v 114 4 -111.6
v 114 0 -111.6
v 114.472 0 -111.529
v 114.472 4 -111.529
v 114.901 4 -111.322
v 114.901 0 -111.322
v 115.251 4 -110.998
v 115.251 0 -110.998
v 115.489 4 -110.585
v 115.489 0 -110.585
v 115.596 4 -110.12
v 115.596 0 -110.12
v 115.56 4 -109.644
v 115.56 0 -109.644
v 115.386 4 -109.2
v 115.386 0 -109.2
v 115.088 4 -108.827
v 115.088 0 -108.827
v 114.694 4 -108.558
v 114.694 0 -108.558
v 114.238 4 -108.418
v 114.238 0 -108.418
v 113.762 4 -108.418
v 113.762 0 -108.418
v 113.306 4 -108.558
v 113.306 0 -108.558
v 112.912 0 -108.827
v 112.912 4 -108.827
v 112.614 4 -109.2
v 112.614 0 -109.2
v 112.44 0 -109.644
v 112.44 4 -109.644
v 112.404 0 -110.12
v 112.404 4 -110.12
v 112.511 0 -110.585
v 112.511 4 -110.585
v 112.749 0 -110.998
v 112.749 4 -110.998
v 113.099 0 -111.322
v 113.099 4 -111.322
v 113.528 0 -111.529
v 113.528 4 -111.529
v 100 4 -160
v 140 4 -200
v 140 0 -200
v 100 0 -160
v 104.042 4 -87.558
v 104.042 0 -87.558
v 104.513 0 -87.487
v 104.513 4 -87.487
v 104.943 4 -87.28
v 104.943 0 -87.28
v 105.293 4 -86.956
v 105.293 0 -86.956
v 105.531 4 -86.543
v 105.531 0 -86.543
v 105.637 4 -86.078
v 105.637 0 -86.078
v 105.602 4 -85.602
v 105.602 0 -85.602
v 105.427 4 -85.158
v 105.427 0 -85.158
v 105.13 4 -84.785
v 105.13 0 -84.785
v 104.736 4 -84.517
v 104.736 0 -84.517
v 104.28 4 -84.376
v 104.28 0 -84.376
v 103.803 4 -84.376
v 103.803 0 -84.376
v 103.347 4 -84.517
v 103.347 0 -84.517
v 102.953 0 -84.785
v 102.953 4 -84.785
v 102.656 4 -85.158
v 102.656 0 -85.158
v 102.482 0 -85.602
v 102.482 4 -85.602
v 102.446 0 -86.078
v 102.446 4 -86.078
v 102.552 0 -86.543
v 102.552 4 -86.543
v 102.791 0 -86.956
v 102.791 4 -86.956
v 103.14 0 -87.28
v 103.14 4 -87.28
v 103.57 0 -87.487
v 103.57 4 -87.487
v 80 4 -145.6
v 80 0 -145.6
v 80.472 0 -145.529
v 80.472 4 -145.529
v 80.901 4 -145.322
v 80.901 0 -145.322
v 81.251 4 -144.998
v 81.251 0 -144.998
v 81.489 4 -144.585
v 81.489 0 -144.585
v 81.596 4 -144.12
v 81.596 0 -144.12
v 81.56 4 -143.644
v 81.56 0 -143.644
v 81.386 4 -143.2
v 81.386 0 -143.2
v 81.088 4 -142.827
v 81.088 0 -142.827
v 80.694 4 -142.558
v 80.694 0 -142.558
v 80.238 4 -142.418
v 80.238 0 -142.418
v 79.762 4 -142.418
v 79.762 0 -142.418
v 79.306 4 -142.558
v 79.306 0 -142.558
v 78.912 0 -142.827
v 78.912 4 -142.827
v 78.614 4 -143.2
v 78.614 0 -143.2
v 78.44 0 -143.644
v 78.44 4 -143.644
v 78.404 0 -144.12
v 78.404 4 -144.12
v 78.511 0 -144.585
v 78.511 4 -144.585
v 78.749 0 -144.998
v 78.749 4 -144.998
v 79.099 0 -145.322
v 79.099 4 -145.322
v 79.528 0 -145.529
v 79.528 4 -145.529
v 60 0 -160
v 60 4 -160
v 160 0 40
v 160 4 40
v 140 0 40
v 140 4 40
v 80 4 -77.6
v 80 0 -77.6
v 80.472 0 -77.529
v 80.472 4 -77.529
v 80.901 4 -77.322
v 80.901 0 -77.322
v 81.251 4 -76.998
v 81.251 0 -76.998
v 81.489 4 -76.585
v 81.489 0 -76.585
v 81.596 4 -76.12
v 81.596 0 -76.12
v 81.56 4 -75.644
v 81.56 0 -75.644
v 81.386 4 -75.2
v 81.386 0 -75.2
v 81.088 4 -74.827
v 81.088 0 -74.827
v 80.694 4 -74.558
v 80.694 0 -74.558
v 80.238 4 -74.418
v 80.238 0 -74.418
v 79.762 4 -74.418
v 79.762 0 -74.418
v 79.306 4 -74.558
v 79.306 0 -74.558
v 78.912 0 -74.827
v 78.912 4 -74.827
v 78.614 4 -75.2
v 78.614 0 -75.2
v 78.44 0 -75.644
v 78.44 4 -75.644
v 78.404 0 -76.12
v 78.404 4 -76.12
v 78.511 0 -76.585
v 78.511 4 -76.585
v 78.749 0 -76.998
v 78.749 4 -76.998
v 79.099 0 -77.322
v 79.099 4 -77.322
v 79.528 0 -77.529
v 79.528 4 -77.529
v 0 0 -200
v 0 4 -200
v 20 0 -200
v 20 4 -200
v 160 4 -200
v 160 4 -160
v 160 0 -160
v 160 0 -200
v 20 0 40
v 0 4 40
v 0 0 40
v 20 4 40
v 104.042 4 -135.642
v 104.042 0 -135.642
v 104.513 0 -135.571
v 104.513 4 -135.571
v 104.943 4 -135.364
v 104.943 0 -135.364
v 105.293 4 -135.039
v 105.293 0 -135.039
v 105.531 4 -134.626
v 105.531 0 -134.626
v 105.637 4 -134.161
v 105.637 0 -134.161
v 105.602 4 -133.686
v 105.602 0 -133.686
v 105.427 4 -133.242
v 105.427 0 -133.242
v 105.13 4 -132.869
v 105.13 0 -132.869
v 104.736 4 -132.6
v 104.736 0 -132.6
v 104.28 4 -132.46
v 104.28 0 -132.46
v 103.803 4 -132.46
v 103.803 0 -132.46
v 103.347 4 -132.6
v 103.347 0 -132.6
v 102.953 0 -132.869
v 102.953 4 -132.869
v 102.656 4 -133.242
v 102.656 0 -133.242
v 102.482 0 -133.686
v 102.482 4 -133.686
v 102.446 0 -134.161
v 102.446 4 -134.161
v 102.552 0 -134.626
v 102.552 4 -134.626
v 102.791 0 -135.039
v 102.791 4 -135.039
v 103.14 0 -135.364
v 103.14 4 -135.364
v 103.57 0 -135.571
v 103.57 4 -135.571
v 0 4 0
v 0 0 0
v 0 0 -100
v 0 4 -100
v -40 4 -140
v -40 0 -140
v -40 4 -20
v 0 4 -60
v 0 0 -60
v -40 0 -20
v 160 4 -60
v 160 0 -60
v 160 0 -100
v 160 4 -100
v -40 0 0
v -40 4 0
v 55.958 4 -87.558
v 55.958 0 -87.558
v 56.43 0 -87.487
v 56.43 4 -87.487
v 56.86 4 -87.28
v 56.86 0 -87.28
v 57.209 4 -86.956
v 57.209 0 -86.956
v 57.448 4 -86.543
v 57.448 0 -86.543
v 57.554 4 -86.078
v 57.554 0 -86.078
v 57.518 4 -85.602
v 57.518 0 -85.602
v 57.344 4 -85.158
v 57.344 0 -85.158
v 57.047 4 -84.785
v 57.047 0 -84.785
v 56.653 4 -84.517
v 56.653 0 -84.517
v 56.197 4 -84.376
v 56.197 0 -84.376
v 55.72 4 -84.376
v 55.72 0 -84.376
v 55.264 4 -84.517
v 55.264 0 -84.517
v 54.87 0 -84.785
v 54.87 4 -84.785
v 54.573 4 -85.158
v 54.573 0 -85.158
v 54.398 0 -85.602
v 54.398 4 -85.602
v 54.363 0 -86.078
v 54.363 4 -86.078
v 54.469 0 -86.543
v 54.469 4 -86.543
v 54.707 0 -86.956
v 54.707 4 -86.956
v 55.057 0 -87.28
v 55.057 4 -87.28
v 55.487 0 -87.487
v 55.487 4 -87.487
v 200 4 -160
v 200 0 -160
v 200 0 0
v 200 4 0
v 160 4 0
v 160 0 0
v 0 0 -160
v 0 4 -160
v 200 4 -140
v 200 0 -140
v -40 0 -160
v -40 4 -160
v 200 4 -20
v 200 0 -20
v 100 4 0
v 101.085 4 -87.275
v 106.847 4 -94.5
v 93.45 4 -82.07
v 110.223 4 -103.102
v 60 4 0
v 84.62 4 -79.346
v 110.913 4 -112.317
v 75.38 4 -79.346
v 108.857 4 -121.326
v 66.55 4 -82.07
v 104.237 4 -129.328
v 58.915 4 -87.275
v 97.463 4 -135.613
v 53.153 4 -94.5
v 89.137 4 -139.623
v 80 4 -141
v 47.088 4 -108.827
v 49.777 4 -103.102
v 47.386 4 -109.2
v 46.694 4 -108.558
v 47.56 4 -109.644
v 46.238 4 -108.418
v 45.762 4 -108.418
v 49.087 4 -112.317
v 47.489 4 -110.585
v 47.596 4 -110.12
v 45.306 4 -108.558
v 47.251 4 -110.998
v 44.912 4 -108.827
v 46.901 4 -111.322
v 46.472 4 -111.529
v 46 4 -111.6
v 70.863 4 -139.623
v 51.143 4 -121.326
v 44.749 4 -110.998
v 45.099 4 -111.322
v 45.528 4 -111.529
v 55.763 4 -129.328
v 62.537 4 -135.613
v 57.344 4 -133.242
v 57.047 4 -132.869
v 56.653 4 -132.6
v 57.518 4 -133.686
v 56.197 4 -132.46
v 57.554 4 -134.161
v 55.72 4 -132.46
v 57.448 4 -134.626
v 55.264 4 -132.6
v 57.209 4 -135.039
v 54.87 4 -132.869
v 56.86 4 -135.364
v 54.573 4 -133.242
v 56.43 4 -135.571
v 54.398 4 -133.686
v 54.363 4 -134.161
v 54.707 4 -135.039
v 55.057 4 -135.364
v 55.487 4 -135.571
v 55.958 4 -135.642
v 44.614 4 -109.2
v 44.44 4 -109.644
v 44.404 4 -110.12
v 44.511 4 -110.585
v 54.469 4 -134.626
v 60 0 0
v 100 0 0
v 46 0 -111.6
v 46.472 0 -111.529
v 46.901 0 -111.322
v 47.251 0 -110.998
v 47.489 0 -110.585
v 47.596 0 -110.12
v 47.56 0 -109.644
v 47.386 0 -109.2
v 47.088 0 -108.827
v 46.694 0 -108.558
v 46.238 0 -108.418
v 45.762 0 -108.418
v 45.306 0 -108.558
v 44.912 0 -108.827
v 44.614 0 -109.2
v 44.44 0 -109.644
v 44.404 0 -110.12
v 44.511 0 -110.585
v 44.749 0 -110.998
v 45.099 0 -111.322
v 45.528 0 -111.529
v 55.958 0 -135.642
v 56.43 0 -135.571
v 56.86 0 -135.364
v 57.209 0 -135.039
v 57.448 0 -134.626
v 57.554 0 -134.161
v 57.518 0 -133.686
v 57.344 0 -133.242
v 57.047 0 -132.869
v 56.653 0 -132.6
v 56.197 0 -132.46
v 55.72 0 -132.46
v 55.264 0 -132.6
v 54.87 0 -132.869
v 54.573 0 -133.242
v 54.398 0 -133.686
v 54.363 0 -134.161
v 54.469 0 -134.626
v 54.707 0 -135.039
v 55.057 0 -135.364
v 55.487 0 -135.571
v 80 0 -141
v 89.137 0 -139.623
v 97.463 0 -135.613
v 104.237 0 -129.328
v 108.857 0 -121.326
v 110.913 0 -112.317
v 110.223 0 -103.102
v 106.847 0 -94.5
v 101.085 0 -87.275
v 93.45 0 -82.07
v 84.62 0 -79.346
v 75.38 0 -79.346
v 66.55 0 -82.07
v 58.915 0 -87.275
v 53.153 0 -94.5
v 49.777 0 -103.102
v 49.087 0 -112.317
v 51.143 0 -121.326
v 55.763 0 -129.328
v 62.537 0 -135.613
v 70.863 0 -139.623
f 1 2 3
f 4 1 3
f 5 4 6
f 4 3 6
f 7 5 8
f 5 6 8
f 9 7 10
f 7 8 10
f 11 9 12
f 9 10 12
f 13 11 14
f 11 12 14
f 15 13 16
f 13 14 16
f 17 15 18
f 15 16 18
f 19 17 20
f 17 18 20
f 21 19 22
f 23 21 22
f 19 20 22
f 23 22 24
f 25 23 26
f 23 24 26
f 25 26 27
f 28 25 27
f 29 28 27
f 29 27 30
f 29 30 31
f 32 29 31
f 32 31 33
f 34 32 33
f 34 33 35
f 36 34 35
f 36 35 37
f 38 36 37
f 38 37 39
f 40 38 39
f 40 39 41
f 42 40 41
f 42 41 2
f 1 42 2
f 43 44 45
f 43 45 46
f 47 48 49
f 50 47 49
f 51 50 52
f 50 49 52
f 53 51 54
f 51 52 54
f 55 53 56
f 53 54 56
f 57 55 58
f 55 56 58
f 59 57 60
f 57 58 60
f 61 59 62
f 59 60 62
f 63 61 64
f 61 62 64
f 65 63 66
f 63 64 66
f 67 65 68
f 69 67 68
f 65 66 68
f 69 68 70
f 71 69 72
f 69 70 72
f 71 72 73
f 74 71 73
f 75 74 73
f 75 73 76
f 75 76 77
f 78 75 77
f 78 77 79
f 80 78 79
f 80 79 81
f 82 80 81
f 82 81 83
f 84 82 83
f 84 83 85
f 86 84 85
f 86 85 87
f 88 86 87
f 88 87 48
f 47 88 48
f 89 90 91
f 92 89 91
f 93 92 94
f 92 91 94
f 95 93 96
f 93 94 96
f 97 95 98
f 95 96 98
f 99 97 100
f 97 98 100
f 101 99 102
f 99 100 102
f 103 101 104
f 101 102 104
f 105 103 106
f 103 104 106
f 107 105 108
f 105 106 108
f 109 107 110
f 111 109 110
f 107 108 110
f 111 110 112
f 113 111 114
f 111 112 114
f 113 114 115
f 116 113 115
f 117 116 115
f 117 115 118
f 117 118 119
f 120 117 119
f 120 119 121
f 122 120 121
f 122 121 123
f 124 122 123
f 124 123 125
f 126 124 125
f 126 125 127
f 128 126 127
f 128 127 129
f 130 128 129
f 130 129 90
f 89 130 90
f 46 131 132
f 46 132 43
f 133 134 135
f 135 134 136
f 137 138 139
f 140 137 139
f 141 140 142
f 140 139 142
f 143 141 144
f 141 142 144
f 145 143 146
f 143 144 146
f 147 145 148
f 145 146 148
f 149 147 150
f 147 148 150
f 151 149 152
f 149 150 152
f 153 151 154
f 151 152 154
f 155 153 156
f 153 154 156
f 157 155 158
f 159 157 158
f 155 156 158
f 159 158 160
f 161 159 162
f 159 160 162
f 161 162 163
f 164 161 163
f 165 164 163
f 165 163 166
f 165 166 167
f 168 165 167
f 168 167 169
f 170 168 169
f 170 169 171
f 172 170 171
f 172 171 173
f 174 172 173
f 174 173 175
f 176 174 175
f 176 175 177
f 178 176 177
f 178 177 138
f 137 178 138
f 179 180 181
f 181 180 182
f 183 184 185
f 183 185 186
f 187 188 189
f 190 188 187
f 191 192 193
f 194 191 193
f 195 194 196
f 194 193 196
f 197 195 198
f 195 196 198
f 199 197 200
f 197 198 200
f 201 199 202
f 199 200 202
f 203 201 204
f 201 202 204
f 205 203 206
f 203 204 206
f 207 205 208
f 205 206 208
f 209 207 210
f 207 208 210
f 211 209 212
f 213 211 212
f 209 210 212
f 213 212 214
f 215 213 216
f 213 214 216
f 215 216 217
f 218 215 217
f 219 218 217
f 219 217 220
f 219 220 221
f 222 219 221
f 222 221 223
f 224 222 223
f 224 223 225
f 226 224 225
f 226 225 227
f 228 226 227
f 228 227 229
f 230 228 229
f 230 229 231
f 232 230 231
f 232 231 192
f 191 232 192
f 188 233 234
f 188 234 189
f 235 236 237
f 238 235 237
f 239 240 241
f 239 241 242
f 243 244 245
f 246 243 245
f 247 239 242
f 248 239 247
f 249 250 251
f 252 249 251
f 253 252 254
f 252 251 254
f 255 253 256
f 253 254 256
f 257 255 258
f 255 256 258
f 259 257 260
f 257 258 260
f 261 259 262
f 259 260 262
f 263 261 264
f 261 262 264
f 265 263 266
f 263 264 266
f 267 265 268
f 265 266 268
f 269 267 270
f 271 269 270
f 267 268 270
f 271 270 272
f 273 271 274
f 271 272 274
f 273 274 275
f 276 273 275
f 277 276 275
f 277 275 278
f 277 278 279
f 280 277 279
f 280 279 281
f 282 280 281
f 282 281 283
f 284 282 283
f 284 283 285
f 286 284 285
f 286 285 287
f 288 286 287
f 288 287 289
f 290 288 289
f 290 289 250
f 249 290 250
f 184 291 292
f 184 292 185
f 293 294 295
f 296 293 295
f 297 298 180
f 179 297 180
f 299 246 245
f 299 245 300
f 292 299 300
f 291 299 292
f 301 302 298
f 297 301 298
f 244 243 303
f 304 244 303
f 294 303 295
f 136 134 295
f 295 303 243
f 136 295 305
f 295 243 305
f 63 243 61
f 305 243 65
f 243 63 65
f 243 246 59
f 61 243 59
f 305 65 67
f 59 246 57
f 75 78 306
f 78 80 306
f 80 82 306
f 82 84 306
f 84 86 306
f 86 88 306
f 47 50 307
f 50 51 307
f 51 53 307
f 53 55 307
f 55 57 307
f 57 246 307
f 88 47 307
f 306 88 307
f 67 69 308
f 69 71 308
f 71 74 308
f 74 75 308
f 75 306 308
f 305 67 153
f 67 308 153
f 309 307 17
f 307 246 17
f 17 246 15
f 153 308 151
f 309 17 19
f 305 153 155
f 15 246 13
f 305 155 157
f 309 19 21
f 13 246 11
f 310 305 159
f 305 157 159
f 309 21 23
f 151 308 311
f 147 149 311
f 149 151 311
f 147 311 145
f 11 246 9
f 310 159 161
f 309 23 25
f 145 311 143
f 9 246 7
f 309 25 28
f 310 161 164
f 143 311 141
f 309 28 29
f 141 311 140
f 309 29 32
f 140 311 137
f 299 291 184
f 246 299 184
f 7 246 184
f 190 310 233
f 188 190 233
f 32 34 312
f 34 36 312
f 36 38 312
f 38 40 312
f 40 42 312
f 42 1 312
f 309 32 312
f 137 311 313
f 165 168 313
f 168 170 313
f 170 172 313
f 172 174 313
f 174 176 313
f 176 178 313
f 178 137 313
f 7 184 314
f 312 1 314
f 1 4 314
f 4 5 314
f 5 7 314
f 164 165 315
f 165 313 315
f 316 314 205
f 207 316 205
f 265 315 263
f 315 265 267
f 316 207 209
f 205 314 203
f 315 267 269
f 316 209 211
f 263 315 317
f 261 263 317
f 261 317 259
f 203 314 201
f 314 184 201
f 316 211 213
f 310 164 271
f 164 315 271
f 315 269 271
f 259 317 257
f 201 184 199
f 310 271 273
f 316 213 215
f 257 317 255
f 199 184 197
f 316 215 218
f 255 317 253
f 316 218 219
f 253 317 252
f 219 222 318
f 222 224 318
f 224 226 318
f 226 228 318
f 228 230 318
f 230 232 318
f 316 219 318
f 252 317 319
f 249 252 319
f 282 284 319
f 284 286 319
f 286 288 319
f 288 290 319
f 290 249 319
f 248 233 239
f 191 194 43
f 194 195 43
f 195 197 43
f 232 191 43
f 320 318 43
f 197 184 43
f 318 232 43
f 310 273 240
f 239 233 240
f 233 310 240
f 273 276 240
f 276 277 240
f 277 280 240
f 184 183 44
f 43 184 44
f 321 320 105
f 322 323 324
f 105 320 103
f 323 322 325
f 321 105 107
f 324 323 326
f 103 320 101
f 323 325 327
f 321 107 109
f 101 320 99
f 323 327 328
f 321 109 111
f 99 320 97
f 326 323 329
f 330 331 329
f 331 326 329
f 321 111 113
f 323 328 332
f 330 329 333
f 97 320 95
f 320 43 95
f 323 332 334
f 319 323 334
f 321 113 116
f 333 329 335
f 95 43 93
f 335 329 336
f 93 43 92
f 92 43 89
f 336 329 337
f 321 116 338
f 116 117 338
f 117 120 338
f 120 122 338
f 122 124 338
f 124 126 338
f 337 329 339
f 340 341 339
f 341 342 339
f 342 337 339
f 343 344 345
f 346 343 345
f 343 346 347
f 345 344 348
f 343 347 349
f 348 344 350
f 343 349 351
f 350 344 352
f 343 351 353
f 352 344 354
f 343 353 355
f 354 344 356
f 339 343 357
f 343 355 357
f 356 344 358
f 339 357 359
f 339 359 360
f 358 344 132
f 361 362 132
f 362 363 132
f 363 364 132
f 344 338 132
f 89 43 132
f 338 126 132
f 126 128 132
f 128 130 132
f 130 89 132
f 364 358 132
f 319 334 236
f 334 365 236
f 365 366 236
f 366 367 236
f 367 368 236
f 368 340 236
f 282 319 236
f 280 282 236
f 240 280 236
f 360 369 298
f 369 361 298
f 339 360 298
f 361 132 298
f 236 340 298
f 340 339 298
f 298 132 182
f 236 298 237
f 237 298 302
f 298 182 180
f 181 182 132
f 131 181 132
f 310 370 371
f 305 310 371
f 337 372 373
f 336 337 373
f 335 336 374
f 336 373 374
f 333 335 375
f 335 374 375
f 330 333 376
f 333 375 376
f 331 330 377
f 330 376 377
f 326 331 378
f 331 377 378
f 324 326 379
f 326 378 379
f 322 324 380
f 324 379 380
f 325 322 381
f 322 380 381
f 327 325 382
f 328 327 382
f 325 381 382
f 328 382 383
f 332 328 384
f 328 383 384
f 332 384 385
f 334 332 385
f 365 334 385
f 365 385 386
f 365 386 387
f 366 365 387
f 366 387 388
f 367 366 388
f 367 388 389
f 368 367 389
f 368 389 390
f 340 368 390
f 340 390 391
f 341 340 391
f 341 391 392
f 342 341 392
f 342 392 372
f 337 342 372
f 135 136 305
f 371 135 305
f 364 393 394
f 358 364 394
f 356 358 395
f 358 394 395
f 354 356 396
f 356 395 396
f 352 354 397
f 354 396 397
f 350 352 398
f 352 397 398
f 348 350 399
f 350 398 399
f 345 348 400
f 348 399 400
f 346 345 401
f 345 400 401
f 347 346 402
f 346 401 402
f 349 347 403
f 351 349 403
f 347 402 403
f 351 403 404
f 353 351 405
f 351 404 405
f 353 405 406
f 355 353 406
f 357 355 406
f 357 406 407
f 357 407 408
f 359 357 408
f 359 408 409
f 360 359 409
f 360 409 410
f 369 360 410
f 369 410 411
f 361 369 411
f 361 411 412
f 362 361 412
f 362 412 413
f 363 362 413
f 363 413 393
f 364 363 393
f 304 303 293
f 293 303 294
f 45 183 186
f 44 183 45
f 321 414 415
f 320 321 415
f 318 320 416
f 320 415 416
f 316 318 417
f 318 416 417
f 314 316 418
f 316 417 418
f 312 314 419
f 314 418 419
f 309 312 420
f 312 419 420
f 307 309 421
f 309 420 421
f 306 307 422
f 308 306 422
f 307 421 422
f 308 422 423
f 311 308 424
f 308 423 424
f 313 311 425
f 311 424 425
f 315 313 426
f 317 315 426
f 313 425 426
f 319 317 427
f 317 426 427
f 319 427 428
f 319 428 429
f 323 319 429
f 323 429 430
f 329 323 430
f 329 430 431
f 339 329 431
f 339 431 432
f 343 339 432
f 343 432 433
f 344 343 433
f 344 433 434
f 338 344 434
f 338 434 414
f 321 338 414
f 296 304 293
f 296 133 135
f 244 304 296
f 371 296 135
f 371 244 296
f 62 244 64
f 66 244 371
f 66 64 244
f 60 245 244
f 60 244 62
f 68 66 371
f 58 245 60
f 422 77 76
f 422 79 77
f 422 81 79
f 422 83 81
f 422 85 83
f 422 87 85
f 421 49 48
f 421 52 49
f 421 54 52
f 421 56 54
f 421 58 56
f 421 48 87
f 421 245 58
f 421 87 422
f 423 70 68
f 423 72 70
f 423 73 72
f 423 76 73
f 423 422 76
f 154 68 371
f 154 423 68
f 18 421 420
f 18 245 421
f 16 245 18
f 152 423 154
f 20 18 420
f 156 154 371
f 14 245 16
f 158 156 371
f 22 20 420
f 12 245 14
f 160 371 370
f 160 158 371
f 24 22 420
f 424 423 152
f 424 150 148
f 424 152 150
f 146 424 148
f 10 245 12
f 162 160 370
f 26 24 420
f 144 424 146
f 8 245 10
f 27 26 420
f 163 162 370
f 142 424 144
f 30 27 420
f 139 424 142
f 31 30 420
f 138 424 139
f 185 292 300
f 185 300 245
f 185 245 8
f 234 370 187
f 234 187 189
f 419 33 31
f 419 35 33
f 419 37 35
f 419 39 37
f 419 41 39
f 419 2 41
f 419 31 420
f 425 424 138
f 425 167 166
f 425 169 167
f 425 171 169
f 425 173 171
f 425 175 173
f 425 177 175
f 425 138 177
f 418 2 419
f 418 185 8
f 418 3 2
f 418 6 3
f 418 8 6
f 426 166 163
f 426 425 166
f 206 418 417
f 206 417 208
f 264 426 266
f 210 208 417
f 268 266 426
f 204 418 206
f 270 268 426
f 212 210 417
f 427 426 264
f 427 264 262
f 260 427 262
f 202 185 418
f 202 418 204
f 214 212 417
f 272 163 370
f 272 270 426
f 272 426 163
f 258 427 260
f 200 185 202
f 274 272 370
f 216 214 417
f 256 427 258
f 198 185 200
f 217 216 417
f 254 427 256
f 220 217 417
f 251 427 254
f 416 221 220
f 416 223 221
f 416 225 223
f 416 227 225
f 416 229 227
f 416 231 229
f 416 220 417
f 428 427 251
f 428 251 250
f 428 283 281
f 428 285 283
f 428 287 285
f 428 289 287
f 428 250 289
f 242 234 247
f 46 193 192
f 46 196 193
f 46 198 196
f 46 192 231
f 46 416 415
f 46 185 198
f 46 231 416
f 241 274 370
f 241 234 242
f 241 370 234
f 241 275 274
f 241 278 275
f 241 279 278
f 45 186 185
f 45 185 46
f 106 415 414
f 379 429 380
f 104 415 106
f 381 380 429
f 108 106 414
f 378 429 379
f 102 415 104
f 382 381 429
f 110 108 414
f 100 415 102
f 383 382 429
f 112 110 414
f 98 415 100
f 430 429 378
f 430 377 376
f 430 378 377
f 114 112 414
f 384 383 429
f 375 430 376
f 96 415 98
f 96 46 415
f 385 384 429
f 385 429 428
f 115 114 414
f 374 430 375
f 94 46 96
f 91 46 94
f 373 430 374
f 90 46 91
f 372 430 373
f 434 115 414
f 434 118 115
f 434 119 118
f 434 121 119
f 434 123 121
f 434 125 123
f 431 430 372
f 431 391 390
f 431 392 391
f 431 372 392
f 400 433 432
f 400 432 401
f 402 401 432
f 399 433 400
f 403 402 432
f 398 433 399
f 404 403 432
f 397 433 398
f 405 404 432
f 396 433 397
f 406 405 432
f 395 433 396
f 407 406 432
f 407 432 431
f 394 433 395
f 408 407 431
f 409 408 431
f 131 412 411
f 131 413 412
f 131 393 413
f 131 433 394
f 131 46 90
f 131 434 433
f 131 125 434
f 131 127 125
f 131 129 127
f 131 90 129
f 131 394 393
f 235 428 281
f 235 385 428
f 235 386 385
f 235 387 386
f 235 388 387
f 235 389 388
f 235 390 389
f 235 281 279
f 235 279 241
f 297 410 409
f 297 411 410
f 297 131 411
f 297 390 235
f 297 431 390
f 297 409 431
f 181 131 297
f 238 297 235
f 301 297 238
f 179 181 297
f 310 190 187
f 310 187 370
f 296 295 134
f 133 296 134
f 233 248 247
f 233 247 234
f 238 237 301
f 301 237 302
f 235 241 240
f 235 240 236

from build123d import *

# Parameters (mm, degrees)
SKETCH_1_W          = 160
SKETCH_1_H          = 160
EXTRUDE_1_DEPTH     = 4
EXTRUDE_2_DEPTH     = 4
SKETCH_3_R          = 31
SKETCH_3_R_2        = 1.6
CUT_EXTRUDE_2_DEPTH = 10


with BuildPart() as part:
    # 草图1 → 凸台-拉伸1 (new body)
    with BuildSketch(Plane(origin=(0, 0, 0), x_dir=(1, 0, 0), z_dir=(0, 1, 0))):
        with Locations((80, 80)):
            Rectangle(SKETCH_1_W, SKETCH_1_H)
    extrude(amount=EXTRUDE_1_DEPTH)

    # 草图2 → 凸台-拉伸2 (add)
    with BuildSketch(Plane(origin=(0, 4, 0), x_dir=(1, 0, 0), z_dir=(0, 1, 0))):
        Polygon((0, 100), (-40, 140), (-40, 160), (0, 160), (0, 200), (20, 200), (60, 160), align=None)
        Polygon((60, 0), (0, 60), (-40, 20), (-40, 0), (0, 0), (0, -40), (20, -40), align=None)
        Polygon((160, 60), (200, 20), (200, 0), (160, 0), (160, -40), (140, -40), (100, 0), align=None)
        Polygon((100, 160), (160, 100), (200, 140), (200, 160), (160, 160), (160, 200), (140, 200), align=None)
    extrude(amount=-EXTRUDE_2_DEPTH)

    # 草图3 → 切除-拉伸2 (cut)
    with BuildSketch(Plane.XZ):
        with Locations(Location((80, -110, 0), (0, 0, 270))):
            Circle(SKETCH_3_R)
        with Locations(Location((80, -76, 0), (0, 0, 270))):
            Circle(SKETCH_3_R_2)
        with Locations(Location((104.04163056, -85.95836944, 0), (0, 0, 270))):
            Circle(SKETCH_3_R_2)
        with Locations(Location((114, -110, 0), (0, 0, 270))):
            Circle(SKETCH_3_R_2)
        with Locations(Location((104.04163056, -134.04163056, 0), (0, 0, 270))):
            Circle(SKETCH_3_R_2)
        with Locations(Location((80, -144, 0), (0, 0, 270))):
            Circle(SKETCH_3_R_2)
        with Locations(Location((55.95836944, -134.04163056, 0), (0, 0, 270))):
            Circle(SKETCH_3_R_2)
        with Locations(Location((46, -110, 0), (0, 0, 270))):
            Circle(SKETCH_3_R_2)
        with Locations(Location((55.95836944, -85.95836944, 0), (0, 0, 270))):
            Circle(SKETCH_3_R_2)
    extrude(amount=-CUT_EXTRUDE_2_DEPTH, mode=Mode.SUBTRACT)


solid = part.part
